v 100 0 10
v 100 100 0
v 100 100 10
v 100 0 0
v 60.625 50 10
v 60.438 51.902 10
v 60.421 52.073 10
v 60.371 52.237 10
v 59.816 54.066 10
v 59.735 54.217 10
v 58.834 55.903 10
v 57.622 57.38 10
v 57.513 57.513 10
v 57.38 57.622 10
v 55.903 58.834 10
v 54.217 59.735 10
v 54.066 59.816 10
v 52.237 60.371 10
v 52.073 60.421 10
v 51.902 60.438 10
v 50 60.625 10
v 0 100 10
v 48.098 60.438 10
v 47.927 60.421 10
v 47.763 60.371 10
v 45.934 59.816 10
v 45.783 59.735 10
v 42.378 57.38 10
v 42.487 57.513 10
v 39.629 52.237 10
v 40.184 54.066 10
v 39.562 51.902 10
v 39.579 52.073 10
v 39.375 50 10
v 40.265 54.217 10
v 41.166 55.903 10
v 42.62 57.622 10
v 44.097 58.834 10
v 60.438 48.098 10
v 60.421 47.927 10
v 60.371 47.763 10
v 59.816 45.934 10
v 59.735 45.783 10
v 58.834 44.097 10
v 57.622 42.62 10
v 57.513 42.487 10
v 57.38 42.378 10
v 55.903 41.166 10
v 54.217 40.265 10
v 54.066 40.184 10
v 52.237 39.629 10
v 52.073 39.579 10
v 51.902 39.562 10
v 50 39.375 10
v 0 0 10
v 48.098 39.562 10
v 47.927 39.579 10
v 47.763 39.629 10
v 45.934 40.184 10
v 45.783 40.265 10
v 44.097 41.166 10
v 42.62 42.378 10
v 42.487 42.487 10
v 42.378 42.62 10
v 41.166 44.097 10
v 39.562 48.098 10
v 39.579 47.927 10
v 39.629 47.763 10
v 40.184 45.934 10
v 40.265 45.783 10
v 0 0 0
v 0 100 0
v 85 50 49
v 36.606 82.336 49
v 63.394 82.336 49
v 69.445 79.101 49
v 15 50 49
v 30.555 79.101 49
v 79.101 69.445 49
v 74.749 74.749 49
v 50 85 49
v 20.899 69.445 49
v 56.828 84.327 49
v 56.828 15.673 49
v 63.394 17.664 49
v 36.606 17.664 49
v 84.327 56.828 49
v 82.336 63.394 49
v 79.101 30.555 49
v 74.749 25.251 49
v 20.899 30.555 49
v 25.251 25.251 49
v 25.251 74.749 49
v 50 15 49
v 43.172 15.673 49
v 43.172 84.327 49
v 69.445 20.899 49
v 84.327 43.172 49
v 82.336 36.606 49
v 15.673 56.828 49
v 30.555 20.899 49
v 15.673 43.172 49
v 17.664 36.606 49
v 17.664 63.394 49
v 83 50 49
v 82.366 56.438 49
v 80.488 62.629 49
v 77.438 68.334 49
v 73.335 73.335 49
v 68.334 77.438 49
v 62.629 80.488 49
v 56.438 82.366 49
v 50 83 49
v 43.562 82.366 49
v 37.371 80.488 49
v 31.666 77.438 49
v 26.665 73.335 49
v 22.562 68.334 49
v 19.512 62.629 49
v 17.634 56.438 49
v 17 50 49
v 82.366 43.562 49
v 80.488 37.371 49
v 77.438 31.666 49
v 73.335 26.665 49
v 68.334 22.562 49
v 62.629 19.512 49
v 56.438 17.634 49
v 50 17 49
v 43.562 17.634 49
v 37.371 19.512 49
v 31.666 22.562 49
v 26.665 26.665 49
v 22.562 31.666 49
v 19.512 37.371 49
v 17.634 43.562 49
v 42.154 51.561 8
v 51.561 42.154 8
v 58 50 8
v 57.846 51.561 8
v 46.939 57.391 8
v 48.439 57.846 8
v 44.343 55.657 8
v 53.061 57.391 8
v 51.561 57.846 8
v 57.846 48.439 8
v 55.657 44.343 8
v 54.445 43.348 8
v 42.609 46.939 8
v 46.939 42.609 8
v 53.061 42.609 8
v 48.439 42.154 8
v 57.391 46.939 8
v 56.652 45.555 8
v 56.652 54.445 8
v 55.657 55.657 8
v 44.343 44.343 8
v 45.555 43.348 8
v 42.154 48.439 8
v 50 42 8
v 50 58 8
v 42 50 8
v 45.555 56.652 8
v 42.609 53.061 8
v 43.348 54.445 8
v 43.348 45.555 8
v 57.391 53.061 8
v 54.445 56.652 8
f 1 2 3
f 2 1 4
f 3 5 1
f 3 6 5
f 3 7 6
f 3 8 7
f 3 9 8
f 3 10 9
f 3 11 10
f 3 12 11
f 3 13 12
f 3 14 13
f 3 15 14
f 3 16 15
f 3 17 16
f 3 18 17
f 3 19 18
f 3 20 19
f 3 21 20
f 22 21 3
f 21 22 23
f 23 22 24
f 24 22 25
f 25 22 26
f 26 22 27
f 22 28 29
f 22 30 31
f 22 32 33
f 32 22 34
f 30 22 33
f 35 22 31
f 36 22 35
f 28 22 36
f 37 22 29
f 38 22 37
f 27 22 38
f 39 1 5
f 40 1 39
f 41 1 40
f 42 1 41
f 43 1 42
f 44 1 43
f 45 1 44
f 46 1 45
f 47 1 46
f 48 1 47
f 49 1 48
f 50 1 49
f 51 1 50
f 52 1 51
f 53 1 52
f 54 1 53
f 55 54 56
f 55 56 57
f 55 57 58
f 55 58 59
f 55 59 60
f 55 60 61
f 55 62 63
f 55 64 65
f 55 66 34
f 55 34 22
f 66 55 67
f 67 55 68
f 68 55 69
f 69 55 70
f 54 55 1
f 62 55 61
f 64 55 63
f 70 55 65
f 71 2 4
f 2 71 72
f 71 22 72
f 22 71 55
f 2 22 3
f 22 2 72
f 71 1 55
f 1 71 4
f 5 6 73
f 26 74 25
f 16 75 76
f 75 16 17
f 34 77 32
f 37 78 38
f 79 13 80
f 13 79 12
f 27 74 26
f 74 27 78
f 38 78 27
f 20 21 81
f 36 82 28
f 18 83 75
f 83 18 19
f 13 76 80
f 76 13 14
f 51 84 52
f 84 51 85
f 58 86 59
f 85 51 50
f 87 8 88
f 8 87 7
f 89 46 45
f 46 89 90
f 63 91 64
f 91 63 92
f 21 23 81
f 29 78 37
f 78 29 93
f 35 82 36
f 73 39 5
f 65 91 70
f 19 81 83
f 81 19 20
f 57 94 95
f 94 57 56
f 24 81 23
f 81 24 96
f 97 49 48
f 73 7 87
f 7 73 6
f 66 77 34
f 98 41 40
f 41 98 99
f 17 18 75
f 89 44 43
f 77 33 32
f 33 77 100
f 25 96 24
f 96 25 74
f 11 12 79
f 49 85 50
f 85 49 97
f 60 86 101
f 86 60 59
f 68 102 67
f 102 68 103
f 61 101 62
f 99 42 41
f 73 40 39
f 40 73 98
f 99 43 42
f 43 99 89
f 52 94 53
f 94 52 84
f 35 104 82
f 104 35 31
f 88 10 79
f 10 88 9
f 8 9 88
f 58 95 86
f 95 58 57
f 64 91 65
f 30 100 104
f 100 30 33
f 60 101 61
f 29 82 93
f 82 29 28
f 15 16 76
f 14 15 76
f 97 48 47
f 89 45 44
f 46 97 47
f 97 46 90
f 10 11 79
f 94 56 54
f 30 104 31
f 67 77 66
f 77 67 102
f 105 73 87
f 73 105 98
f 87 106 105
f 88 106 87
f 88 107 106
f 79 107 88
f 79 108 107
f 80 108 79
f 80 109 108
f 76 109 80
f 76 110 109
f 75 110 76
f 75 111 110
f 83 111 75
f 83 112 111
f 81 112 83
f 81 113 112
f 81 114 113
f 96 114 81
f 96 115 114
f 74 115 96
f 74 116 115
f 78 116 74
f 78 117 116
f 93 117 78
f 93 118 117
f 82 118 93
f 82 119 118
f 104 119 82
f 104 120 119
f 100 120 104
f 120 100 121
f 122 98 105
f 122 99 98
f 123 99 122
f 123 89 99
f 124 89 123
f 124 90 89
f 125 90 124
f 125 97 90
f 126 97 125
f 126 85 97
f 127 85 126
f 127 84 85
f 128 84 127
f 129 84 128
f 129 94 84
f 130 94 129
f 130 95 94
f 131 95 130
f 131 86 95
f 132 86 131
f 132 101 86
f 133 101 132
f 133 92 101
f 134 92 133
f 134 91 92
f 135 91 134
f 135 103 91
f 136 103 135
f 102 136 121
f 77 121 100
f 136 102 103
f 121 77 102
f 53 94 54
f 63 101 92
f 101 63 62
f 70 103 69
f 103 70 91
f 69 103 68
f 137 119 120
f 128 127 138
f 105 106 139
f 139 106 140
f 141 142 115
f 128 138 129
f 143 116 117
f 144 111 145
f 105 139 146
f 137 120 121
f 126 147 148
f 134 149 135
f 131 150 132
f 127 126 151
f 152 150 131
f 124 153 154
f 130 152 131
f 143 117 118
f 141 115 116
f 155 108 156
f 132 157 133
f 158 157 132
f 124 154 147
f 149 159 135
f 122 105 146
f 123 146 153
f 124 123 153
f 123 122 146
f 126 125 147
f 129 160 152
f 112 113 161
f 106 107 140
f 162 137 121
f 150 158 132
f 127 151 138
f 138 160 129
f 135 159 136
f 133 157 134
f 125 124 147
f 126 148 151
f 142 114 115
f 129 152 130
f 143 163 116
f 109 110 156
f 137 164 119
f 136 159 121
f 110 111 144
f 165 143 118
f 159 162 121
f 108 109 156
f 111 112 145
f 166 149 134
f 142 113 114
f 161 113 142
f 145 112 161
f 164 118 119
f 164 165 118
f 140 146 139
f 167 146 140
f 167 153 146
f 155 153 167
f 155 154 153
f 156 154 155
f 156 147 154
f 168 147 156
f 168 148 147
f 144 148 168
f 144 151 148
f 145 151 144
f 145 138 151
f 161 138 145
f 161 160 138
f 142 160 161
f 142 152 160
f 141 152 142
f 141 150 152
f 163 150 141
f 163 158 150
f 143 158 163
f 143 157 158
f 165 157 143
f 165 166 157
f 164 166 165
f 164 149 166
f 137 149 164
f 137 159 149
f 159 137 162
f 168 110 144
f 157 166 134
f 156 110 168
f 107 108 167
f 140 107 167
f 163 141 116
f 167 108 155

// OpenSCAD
$fn = 32;

// ----------------------------------------------------------------------
// Hopper: funnel with square flange
// ----------------------------------------------------------------------

// --- parameters (mm) ---
fl = 100;                 // flange side, X and Y
fl_t = 10;                // flange thickness
cone_h = 40;              // cone height above the flange
top_d = 70;               // cone mouth diameter
bot_d = 20;               // cone spout diameter
wall = 2;                 // cone wall thickness

bore_d = bot_d - 2 * wall;  // spout bore diameter
total_h = fl_t + cone_h - 1;  // overall height

difference() {
  union() {
    cube([fl, fl, fl_t]);
    translate([fl / 2, fl / 2, fl_t - 1])
      cylinder(h = cone_h, d1 = bot_d, d2 = top_d);
  }
  translate([fl / 2, fl / 2, fl_t - 2])
    cylinder(h = cone_h + 1, d1 = bore_d, d2 = top_d - 2 * wall);
}
